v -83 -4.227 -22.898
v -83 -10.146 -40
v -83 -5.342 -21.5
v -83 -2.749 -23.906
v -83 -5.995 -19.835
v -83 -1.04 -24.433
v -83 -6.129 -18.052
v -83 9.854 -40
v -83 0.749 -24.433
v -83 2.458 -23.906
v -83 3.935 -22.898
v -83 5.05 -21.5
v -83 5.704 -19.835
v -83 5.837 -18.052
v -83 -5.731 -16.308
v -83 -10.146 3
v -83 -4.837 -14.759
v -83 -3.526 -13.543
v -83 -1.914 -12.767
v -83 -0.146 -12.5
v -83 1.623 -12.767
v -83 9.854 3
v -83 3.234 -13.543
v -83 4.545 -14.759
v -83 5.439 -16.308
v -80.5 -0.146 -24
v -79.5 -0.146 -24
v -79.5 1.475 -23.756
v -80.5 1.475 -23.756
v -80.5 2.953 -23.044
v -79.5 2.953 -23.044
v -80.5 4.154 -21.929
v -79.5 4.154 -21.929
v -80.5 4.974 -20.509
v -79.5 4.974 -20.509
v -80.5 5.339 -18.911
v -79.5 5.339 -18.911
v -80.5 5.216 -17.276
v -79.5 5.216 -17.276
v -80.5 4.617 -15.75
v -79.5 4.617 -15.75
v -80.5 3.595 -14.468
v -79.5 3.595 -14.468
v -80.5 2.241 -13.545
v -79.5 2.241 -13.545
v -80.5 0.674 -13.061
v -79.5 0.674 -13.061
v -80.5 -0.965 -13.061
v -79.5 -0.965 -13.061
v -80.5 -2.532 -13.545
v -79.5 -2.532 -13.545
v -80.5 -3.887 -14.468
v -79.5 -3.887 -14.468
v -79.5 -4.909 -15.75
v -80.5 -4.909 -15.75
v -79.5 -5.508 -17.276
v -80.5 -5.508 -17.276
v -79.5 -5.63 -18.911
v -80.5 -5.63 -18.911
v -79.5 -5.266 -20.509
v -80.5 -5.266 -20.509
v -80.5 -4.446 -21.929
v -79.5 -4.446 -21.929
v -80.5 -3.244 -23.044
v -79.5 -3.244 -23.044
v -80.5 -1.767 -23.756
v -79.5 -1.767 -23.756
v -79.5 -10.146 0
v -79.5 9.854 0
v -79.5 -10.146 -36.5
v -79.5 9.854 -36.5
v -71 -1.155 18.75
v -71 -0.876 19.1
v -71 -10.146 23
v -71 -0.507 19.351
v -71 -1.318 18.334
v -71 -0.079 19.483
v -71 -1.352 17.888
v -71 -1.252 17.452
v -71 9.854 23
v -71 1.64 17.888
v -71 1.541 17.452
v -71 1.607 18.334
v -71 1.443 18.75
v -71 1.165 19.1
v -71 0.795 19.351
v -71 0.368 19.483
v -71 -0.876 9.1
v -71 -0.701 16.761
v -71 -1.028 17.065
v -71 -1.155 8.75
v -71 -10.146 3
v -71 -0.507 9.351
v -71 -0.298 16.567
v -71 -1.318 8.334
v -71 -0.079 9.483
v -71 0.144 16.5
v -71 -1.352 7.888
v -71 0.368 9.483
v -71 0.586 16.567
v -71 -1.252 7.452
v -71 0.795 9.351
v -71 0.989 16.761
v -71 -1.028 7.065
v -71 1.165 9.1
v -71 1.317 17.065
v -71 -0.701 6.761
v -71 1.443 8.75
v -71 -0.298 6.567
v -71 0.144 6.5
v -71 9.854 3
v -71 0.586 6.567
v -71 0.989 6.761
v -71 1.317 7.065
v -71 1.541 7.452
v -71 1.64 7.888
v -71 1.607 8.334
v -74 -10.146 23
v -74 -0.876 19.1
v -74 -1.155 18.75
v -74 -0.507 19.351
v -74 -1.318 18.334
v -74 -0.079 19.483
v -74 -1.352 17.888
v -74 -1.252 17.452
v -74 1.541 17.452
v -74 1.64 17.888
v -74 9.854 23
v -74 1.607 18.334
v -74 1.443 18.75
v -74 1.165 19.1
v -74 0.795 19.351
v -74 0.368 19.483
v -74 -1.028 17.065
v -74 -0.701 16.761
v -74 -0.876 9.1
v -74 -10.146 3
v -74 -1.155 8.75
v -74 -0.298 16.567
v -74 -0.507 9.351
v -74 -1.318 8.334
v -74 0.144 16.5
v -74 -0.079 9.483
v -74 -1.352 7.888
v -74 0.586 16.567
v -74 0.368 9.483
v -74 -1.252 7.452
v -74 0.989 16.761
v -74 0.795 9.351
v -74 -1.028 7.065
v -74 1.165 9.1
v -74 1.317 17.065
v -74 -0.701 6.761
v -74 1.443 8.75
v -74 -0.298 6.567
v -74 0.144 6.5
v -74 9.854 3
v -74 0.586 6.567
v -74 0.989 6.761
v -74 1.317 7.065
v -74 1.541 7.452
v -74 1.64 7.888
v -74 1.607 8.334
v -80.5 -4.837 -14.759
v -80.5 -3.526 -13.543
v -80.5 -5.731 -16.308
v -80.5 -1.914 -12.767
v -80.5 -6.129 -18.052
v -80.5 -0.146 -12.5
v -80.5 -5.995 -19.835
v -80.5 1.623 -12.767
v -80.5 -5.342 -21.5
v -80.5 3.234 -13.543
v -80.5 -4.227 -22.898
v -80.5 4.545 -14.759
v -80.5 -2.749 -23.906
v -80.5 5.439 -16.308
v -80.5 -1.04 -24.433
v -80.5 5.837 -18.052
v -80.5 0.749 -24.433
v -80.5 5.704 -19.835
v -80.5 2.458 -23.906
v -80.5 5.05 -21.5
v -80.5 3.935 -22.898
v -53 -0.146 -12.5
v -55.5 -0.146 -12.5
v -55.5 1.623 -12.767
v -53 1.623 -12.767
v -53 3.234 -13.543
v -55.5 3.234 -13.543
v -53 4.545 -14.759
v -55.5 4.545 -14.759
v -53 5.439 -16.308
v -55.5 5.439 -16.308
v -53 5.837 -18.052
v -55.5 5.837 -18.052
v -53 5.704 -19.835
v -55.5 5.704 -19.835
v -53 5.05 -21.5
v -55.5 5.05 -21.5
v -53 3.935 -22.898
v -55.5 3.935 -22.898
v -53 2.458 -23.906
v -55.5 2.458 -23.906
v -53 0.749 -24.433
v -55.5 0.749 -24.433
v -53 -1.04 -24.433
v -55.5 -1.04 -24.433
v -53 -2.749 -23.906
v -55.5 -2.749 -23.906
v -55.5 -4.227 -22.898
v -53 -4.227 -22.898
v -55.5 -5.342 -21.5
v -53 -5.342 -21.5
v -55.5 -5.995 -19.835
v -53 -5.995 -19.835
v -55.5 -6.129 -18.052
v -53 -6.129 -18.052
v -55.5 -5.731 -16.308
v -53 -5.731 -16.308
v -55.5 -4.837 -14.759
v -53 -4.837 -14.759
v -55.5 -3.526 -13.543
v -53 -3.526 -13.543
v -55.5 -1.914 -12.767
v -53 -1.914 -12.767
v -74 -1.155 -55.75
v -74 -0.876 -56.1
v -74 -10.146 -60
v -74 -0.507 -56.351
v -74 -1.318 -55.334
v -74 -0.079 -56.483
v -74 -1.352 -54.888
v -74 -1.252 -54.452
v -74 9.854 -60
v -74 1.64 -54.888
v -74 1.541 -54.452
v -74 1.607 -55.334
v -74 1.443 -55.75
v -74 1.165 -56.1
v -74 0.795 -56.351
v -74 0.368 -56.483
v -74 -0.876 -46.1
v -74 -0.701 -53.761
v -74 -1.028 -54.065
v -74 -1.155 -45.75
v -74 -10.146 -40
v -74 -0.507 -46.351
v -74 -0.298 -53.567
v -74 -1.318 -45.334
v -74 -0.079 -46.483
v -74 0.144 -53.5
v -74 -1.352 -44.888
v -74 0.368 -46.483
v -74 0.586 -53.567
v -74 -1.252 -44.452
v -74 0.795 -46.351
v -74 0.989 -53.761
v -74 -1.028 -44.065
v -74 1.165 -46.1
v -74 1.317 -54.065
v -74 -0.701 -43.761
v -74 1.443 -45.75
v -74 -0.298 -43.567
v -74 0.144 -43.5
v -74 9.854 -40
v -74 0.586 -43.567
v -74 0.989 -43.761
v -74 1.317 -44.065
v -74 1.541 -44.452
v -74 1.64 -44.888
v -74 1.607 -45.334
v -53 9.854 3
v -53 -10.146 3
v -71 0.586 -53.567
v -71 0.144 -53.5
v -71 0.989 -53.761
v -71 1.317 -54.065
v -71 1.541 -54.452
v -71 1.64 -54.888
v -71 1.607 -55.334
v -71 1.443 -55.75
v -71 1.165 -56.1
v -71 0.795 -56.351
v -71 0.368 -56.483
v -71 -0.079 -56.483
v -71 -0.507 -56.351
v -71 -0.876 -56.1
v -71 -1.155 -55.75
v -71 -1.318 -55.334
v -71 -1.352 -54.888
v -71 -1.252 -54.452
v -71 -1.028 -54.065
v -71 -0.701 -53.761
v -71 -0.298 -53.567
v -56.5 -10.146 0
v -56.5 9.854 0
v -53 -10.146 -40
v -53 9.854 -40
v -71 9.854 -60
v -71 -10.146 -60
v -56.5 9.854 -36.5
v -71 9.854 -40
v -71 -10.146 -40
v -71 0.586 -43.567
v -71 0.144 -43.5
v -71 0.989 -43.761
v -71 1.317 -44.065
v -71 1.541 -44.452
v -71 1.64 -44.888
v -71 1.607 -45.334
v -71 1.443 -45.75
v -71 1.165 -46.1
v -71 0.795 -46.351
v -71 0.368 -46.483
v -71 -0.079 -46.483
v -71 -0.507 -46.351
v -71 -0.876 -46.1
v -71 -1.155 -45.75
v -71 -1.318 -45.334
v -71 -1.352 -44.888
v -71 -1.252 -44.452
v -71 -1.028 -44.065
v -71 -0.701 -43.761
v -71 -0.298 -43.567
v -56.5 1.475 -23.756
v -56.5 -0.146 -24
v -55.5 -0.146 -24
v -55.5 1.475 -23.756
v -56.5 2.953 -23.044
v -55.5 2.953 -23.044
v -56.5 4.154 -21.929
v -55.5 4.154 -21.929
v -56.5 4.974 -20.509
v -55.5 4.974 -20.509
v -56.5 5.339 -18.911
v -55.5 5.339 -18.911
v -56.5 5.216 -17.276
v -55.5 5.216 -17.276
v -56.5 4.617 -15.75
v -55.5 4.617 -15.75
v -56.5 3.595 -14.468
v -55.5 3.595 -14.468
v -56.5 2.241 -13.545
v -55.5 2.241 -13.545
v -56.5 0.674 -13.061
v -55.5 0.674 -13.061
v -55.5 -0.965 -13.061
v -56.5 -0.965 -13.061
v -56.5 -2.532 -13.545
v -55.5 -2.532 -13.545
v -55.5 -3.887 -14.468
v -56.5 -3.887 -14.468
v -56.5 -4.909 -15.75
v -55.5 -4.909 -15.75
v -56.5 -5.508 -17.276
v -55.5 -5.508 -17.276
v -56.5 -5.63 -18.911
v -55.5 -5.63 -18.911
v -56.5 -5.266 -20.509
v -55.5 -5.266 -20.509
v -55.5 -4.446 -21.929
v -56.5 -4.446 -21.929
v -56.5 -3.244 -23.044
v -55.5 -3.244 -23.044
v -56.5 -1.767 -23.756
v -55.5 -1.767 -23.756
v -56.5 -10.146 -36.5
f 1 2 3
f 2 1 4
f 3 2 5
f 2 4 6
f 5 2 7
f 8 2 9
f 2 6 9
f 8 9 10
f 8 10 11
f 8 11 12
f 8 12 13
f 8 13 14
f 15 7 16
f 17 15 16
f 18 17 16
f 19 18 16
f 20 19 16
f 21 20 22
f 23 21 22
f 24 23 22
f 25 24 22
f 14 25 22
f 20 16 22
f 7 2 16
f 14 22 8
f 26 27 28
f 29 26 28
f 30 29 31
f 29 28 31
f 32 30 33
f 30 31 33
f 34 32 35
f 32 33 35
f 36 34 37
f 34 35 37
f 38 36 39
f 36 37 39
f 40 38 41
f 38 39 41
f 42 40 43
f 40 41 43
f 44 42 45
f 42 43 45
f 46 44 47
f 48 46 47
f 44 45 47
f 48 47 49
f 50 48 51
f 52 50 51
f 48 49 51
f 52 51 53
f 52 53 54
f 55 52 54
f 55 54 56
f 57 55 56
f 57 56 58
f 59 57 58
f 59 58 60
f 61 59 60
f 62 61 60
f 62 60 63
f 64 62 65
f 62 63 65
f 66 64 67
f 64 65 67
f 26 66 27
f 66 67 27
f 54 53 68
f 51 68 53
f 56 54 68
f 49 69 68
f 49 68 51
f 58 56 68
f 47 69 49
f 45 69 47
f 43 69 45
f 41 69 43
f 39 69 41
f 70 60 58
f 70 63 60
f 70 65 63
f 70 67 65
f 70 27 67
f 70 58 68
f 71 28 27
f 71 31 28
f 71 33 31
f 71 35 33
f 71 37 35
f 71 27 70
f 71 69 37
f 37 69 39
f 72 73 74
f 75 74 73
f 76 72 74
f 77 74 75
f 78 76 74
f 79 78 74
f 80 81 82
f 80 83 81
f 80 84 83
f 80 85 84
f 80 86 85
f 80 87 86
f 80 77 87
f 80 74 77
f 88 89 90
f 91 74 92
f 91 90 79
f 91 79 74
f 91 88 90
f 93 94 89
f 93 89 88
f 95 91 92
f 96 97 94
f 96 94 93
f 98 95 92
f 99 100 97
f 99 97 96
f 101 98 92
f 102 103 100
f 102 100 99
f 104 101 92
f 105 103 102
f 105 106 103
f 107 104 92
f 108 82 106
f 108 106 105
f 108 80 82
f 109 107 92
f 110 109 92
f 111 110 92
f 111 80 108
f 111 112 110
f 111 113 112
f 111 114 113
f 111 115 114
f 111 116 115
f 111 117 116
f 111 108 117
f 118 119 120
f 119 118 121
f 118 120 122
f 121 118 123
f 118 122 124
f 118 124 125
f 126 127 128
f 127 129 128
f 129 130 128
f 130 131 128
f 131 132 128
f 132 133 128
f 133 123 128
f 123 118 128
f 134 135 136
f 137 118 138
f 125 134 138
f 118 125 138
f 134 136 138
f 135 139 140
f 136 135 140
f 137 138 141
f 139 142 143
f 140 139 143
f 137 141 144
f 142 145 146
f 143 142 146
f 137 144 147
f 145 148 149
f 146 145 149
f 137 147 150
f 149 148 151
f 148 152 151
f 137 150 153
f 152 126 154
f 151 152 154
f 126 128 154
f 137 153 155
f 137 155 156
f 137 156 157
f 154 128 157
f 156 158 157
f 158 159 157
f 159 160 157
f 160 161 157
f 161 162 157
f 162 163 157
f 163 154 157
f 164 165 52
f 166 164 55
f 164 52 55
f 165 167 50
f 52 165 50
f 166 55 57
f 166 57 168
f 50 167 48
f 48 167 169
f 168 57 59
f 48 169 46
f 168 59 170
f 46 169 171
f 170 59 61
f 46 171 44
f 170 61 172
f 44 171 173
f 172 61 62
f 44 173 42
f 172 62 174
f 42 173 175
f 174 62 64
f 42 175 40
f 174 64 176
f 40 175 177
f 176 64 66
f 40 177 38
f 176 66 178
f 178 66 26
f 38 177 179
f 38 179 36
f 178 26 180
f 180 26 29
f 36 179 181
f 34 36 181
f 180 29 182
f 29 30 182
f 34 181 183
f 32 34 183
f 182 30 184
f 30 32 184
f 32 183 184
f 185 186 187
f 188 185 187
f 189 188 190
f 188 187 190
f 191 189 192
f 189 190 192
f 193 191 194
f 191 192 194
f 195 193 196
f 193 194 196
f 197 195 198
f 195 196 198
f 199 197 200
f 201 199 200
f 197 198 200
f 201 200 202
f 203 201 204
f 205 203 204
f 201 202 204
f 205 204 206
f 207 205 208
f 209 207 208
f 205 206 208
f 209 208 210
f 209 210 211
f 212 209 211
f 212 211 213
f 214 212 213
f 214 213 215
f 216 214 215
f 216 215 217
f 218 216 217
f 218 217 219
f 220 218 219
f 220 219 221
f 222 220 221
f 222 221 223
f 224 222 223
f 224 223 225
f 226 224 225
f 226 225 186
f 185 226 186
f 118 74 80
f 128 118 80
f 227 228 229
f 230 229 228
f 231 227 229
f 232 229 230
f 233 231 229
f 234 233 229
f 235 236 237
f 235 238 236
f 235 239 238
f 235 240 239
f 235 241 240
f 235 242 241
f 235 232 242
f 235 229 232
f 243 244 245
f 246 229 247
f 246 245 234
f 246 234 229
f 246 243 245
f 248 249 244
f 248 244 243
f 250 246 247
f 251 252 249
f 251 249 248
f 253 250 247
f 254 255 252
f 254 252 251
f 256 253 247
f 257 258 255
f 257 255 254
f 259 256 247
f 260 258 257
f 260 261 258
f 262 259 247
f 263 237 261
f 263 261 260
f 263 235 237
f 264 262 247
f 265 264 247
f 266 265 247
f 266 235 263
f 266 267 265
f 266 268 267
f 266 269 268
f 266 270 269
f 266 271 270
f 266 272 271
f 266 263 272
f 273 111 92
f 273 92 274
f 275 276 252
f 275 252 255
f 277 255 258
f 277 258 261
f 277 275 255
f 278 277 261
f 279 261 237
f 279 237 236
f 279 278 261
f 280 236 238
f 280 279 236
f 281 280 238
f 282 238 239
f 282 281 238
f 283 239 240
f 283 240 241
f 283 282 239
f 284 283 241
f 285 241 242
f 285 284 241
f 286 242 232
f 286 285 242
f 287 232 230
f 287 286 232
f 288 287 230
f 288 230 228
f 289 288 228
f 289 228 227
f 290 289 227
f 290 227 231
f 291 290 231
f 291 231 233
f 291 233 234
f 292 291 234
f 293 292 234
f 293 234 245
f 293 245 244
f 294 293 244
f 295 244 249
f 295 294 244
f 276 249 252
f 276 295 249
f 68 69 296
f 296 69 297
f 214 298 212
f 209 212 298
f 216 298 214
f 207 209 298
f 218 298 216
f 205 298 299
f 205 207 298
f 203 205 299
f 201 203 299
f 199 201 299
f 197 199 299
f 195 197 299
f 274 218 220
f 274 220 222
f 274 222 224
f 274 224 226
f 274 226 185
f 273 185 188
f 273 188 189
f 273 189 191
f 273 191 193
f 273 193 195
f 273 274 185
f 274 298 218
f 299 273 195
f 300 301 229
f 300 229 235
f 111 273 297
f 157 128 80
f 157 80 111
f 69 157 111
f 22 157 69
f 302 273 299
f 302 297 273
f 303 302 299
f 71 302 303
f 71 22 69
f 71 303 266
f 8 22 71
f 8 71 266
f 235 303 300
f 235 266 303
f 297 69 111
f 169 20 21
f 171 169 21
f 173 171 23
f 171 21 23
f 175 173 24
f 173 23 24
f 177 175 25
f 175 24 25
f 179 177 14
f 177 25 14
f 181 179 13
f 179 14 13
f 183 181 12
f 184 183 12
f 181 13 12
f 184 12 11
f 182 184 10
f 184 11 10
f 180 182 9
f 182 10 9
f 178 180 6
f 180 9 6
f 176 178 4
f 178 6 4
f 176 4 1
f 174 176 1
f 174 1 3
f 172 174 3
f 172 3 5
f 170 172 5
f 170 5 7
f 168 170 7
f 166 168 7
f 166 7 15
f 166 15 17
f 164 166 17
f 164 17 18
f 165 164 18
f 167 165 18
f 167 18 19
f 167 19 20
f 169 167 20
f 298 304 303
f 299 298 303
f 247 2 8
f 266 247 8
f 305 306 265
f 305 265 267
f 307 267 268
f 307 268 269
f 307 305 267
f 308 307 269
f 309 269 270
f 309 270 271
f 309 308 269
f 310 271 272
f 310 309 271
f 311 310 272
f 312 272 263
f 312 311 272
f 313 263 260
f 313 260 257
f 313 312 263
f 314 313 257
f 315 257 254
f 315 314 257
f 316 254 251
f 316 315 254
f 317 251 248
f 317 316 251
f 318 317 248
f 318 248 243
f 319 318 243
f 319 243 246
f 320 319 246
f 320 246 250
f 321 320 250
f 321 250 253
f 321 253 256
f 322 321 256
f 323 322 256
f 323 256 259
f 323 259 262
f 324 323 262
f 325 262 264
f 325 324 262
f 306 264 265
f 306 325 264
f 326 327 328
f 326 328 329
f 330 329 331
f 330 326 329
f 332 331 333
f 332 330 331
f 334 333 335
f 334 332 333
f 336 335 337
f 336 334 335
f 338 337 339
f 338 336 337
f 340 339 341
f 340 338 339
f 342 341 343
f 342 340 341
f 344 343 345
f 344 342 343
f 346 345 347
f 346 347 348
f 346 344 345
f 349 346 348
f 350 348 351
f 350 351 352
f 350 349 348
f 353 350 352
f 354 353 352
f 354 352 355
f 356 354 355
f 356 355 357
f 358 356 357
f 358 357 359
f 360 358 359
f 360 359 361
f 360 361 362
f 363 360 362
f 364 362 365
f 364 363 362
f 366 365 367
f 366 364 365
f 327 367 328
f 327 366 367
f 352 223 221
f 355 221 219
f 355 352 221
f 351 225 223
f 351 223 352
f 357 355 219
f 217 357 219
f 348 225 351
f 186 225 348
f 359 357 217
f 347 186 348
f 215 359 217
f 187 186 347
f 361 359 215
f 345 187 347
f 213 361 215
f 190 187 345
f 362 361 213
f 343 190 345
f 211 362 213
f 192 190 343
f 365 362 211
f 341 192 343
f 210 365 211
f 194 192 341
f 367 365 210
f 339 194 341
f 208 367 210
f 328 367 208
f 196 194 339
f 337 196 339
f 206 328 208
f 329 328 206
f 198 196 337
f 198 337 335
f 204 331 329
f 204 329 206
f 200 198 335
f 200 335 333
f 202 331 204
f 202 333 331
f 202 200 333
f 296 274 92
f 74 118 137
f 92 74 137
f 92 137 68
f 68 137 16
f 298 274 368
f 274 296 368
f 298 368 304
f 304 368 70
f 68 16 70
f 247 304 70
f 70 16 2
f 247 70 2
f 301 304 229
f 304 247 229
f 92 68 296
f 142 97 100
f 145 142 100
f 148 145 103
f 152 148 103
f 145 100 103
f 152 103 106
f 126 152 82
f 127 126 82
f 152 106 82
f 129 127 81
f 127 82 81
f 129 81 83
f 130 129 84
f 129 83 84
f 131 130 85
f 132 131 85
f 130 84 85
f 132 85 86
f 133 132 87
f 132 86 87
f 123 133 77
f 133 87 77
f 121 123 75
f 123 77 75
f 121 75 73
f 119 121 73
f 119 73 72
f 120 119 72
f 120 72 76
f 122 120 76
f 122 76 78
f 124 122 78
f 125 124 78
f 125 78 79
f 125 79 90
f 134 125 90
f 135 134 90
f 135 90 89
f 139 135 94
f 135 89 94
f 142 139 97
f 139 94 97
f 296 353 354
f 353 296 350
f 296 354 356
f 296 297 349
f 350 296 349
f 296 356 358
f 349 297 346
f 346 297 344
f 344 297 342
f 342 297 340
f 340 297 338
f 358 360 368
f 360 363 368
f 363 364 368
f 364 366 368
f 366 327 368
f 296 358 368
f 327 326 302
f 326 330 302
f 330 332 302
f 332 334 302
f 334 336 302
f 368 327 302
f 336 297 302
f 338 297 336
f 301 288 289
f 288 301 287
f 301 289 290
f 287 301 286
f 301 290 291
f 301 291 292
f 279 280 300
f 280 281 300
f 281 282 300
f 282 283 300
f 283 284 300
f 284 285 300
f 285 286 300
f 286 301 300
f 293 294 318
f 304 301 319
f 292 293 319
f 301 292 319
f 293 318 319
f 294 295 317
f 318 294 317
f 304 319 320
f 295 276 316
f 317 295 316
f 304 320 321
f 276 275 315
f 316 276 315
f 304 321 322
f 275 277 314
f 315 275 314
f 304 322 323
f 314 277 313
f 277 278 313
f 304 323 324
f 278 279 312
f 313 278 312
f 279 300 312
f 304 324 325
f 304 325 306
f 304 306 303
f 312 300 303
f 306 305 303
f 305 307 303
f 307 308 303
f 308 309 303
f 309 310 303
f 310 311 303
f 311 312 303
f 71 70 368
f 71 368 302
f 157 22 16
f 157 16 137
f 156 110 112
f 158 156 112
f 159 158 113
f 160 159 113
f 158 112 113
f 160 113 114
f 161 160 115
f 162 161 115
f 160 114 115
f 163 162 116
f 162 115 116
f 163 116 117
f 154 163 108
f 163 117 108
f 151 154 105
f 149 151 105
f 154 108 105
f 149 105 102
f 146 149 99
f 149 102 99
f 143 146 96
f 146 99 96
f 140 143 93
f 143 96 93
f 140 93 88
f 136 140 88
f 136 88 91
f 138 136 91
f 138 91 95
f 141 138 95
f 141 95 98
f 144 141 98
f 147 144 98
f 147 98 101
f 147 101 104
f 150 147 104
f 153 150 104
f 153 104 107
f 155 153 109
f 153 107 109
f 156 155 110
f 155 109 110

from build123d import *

# Parameters (mm, degrees)
SKETCH_1_W          = 30
SKETCH_1_H          = 20
EXTRUDE_1_DEPTH     = 3
EXTRUDE_2_DEPTH     = 40
SKETCH_1_4_W        = 3.5
SKETCH_1_4_H        = 20
EXTRUDE_3_DEPTH     = 40
SKETCH_3_R          = 6
CUT_EXTRUDE_2_DEPTH = 38
SKETCH_4_R          = 6
SKETCH_4_R_2        = 5.5
EXTRUDE_4_DEPTH     = 1
SKETCH_5_R          = 6
SKETCH_5_R_2        = 5.5
EXTRUDE_5_DEPTH     = 1
SKETCH_7_W          = 3.5
SKETCH_7_H          = 20
EXTRUDE_6_DEPTH     = 23
SKETCH_9_W          = 20
SKETCH_9_H          = 20
SKETCH_9_R          = 1.5
EXTRUDE_7_DEPTH     = 3


with BuildPart() as part:
    # Sketch 1 → Extrude 1 (new body)
    with BuildSketch(Plane.XY):
        with Locations((-68, -0.145751311)):
            Rectangle(SKETCH_1_W, SKETCH_1_H)
    extrude(amount=EXTRUDE_1_DEPTH)

    # Sketch 1_3 → Extrude 2 (add)
    with BuildSketch(Plane.XY):
        Polygon((-56.5, 9.854248689), (-56.5, -10.145751311), (-53, -10.145751311), (-53, -0.145751311), (-53, 9.854248689), align=None)
    extrude(amount=-EXTRUDE_2_DEPTH)

    # Sketch 1_4 → Extrude 3 (add)
    with BuildSketch(Plane.XY):
        with Locations((-81.25, -0.145751311)):
            Rectangle(SKETCH_1_4_W, SKETCH_1_4_H)
    extrude(amount=-EXTRUDE_3_DEPTH)

    # Sketch 3 → Cut-Extrude 2 (cut)
    with BuildSketch(Plane.ZY.offset(83)):
        with Locations((-18.5, -0.145751311)):
            Circle(SKETCH_3_R)
    extrude(amount=-CUT_EXTRUDE_2_DEPTH, mode=Mode.SUBTRACT)

    # Sketch 4 → Extrude 4 (add)
    with BuildSketch(Plane(origin=(-56.5, 0, 0), x_dir=(0, 0, -1), z_dir=(1, 0, 0))):
        with Locations((18.5, -0.145751311)):
            Circle(SKETCH_4_R)
        with Locations((18.5, -0.145751311)):
            Circle(SKETCH_4_R_2, mode=Mode.SUBTRACT)
    extrude(amount=EXTRUDE_4_DEPTH)

    # Sketch 5 → Extrude 5 (add)
    with BuildSketch(Plane(origin=(-79.5, 0, 0), x_dir=(0, 0, -1), z_dir=(1, 0, 0))):
        with Locations((18.5, -0.145751311)):
            Circle(SKETCH_5_R)
        with Locations((18.5, -0.145751311)):
            Circle(SKETCH_5_R_2, mode=Mode.SUBTRACT)
    extrude(amount=-EXTRUDE_5_DEPTH)

    # Sketch 7 → Extrude 6 (add)
    with BuildSketch(Plane(origin=(-79.5, 0, 0), x_dir=(0, 0, -1), z_dir=(1, 0, 0))):
        with Locations((38.25, -0.145751311)):
            Rectangle(SKETCH_7_W, SKETCH_7_H)
    extrude(amount=EXTRUDE_6_DEPTH)

    # Sketch 9 → Extrude 7 (add)
    with BuildSketch(Plane.ZY.offset(71)):
        with Locations((-50, -0.145751311)):
            Rectangle(SKETCH_9_W, SKETCH_9_H)
        with Locations((-55, 0.144248689)):
            Circle(SKETCH_9_R, mode=Mode.SUBTRACT)
        with Locations((-45, 0.144248689)):
            Circle(SKETCH_9_R, mode=Mode.SUBTRACT)
    extrude_7 = extrude(amount=EXTRUDE_7_DEPTH)

    # Mirror 1: Extrude 7 across plane
    add(extrude_7.mirror(Plane.XY.offset(-18.5)))


solid = part.part
